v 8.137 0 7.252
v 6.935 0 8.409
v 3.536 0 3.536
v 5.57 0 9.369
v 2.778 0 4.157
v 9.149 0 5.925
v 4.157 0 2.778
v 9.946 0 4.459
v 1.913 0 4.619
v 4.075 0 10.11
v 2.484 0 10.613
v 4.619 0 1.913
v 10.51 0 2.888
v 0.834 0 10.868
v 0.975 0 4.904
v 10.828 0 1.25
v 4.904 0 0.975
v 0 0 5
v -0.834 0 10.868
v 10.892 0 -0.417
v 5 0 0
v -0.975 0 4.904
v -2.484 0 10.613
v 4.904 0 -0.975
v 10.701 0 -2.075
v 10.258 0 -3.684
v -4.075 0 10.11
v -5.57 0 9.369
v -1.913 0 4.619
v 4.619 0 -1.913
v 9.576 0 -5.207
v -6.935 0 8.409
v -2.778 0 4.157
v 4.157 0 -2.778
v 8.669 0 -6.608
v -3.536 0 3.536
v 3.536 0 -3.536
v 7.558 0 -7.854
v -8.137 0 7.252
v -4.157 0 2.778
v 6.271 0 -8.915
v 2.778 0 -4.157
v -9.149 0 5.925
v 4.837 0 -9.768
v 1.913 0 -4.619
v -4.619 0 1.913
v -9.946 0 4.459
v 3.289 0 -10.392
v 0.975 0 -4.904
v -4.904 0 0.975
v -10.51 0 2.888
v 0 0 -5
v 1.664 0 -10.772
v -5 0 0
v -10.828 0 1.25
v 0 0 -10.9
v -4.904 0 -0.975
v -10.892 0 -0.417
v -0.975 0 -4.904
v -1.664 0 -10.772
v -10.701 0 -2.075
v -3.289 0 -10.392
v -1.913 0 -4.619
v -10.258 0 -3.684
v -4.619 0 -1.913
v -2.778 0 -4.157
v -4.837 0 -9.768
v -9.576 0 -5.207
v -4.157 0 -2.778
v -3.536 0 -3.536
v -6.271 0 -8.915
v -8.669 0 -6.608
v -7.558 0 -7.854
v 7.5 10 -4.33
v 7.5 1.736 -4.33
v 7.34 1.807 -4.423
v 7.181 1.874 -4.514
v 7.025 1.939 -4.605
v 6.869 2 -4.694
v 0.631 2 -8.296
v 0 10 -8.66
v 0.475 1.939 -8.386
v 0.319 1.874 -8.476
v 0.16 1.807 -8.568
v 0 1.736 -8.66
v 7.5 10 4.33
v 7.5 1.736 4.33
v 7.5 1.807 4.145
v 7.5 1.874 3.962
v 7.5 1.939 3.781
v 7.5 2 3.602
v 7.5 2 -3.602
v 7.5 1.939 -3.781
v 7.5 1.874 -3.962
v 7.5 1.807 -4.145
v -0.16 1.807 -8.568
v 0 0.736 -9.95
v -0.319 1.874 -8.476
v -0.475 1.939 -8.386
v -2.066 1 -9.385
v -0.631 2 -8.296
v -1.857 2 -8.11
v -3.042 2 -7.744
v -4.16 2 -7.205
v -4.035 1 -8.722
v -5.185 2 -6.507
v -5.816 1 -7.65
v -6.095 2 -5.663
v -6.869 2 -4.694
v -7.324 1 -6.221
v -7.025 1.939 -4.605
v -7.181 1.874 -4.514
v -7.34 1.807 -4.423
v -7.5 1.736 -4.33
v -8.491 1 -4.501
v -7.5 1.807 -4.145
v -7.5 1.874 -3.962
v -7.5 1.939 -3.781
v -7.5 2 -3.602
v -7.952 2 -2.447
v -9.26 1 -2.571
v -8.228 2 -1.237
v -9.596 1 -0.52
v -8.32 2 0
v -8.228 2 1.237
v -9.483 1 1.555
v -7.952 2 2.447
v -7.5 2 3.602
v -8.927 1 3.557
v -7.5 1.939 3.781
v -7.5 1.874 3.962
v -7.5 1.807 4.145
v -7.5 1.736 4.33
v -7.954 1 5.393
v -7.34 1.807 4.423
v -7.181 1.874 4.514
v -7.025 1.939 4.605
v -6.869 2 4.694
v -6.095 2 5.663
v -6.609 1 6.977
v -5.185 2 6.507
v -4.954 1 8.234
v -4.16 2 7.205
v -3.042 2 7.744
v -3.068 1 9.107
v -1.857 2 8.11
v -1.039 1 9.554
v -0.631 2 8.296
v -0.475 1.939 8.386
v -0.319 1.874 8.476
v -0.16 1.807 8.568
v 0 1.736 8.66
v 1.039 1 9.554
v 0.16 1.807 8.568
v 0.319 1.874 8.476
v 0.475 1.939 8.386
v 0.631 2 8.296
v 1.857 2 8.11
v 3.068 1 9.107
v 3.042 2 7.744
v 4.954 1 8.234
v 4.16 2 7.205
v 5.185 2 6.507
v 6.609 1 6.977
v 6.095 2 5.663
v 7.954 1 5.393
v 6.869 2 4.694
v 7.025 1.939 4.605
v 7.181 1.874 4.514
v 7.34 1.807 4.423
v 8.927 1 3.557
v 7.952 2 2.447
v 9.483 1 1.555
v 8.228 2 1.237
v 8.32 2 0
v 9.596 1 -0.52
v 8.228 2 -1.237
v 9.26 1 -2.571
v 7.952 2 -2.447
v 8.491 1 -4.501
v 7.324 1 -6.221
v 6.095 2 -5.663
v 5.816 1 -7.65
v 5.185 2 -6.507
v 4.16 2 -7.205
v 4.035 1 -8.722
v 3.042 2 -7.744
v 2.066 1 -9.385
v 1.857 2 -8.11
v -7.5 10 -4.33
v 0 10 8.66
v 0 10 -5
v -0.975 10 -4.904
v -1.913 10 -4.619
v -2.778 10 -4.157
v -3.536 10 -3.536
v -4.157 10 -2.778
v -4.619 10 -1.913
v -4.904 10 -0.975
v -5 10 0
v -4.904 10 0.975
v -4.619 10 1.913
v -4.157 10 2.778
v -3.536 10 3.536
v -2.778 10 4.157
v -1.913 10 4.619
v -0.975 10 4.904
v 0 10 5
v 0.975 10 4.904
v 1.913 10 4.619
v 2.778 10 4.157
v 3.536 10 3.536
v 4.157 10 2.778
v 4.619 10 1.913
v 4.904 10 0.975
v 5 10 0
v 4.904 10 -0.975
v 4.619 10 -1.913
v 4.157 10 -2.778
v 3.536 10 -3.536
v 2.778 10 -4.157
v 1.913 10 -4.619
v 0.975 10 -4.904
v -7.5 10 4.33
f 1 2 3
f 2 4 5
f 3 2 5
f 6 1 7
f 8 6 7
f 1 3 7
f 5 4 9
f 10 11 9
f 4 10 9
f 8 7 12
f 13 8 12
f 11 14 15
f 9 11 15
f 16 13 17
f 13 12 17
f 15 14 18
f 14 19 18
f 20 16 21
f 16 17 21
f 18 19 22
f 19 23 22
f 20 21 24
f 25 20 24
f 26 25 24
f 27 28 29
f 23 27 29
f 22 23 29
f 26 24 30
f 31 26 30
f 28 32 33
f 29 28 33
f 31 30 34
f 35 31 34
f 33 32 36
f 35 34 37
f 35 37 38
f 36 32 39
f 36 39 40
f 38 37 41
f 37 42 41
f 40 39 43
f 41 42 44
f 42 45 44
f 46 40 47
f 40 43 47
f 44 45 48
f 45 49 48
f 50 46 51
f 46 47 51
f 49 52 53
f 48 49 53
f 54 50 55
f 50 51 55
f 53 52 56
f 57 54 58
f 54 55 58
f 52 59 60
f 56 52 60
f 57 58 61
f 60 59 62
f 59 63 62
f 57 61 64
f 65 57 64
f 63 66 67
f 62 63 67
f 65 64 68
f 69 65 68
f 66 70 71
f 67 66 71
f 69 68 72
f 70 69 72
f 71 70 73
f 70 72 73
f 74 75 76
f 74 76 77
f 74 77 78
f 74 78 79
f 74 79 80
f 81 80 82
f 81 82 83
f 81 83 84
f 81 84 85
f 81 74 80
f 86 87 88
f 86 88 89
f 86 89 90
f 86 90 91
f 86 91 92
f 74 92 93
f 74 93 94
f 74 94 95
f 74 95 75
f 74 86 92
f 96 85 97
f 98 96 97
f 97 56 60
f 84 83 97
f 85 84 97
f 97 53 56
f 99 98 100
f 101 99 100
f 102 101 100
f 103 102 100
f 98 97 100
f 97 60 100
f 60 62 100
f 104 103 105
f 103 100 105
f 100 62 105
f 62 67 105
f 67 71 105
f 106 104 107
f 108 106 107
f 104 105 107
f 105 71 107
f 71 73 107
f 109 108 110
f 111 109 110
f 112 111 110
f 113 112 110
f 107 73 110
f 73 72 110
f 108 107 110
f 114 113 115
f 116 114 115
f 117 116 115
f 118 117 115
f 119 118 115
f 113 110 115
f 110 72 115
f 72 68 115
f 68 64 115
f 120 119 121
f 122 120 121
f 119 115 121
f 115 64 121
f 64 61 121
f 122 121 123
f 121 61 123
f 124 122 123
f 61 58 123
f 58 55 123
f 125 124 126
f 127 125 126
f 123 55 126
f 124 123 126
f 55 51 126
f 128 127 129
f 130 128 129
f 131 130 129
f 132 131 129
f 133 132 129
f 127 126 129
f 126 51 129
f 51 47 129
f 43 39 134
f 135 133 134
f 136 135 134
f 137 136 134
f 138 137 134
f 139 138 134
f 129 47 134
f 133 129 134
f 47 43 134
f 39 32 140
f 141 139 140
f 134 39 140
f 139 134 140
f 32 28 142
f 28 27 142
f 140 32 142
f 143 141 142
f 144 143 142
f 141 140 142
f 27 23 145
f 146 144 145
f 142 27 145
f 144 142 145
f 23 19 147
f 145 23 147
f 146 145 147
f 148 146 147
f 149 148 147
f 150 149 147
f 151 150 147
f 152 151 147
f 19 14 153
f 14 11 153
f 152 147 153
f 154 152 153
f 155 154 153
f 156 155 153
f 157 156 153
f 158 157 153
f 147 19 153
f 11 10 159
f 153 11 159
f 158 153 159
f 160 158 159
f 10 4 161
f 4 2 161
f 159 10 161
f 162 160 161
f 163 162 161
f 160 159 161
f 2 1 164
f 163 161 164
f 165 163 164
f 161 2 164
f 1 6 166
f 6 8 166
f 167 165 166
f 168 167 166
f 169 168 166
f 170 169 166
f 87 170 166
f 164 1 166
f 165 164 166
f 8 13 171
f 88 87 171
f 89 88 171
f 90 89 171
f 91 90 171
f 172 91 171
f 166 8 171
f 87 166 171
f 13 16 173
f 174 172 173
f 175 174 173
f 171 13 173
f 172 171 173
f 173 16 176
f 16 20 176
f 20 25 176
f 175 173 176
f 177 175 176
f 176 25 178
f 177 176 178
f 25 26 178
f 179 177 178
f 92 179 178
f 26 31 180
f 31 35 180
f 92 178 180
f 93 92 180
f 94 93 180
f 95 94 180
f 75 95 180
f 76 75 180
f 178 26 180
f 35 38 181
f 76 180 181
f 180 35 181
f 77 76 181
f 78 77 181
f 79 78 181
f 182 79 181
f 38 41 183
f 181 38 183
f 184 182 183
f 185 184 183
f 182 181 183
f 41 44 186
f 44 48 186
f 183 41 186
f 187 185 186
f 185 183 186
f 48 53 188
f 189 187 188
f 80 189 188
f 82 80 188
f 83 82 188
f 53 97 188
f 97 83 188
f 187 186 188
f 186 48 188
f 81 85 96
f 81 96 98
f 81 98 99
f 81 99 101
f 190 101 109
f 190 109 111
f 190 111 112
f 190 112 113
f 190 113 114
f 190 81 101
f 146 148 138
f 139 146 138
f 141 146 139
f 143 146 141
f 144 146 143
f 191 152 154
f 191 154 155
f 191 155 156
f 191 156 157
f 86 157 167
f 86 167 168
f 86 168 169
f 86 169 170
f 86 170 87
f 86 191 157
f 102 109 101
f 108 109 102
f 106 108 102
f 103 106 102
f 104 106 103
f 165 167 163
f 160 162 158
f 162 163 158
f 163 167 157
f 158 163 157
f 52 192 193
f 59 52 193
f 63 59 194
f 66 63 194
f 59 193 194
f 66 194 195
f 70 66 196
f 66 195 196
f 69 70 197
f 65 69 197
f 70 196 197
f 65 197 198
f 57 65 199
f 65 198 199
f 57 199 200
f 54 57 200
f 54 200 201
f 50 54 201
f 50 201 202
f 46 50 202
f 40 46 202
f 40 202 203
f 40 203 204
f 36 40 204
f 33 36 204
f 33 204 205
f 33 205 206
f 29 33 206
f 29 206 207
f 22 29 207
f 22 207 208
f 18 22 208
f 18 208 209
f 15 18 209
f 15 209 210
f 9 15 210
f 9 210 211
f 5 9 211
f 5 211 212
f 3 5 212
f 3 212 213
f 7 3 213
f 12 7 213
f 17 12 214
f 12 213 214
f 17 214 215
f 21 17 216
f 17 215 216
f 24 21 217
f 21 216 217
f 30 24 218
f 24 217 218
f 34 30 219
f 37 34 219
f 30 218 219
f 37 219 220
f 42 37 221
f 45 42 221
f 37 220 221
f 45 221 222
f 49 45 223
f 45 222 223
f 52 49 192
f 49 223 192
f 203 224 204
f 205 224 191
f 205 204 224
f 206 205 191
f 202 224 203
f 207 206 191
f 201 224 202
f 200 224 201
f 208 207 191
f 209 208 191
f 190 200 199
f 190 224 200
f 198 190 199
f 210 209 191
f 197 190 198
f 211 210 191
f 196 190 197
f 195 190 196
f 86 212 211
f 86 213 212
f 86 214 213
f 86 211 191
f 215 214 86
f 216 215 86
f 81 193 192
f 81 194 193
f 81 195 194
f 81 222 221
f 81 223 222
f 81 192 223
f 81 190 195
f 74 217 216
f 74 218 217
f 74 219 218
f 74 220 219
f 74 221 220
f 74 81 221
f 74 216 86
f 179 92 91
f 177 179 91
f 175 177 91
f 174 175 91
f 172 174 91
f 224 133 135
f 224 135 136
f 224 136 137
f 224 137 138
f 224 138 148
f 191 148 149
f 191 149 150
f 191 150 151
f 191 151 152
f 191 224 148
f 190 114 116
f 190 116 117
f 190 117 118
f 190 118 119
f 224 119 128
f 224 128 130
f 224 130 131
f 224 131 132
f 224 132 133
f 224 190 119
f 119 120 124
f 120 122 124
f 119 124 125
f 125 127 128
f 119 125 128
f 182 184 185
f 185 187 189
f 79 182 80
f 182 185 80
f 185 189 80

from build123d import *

# Parameters (mm, degrees)
DODANIE_WYCI_GNI_CIE1_START = 8
SZKIC2_R                    = 5
DODANIE_WYCI_GNI_CIE1_DEPTH = 10


with BuildPart() as part:
    # Szkic1 → Obrót1 (revolve)
    with BuildSketch(Plane.XY, mode=Mode.PRIVATE) as obr_t1_sk:
        Polygon((5, 0), (5, 2), (8.32, 2), (10.9, 0), align=None)
    revolve(obr_t1_sk.sketch.rotate(Axis((0, 0, 0), (0, 1, 0)), 90), axis=Axis((0, 0, 0), (0, 1, 0)))

    # Szkic2 → Dodanie-wyciągnięcie1 (add)
    with BuildSketch(Plane(origin=(0, 2, 0), x_dir=(1, 0, 0), z_dir=(0, 1, 0)).offset(DODANIE_WYCI_GNI_CIE1_START)):
        Polygon((0, 8.660254038), (-7.5, 4.330127019), (-7.5, -4.330127019), (0, -8.660254038), (7.5, -4.330127019), (7.5, 4.330127019), align=None)
        with Locations(Location((0, 0, 0), (0, 0, 90))):
            Circle(SZKIC2_R, mode=Mode.SUBTRACT)
    extrude(amount=-DODANIE_WYCI_GNI_CIE1_DEPTH)


solid = part.part
